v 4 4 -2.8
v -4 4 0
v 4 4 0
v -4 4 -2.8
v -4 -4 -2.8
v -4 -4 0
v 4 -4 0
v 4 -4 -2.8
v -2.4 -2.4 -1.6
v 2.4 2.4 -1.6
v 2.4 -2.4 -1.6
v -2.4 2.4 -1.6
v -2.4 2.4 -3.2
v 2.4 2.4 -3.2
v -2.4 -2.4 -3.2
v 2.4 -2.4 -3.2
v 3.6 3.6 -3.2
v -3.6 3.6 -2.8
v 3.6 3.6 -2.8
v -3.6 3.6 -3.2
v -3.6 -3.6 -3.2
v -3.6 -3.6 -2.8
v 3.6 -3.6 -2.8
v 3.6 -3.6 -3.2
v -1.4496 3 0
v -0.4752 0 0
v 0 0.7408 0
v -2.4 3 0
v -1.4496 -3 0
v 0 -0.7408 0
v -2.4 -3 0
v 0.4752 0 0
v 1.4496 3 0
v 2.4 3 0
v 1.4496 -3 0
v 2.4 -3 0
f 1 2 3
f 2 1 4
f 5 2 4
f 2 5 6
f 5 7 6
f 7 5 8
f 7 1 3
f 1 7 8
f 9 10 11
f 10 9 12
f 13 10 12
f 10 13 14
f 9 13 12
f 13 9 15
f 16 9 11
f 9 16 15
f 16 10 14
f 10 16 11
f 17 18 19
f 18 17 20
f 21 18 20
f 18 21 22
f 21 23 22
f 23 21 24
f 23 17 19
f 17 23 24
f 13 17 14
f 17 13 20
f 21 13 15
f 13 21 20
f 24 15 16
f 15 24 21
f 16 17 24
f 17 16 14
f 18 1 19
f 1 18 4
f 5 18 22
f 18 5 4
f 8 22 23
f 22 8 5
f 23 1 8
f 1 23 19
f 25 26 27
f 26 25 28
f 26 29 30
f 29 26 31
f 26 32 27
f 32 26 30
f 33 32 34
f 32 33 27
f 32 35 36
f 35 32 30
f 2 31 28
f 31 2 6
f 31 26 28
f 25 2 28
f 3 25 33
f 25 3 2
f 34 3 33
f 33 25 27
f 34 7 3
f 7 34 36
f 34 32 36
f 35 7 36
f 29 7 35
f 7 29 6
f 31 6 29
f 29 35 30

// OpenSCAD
// file: ../p/box5.scad
use <../lib.scad>
function ldraw_lib__box5() = [
// 0 Box with 5 Faces and All Edges
// 0 Name: box5.dat
// 0 Author: James Jessiman
// 0 !LDRAW_ORG Primitive UPDATE 2012-01
// 0 !LICENSE Licensed under CC BY 2.0 and CC BY 4.0 : see CAreadme.txt
// 
// 0 BFC CERTIFY CCW
  [0,"BFC","CERTIFY"],
  [0,"BFC","CCW"],
// 
// 0 !HISTORY 2002-04-03 [sbliss] Modified for BFC compliance
// 0 !HISTORY 2002-04-25 [PTadmin] Official Update 2002-02
// 0 !HISTORY 2007-06-24 [PTadmin] Header formatted for Contributor Agreement
// 0 !HISTORY 2008-07-01 [PTadmin] Official Update 2008-01
// 0 !HISTORY 2012-02-16 [Philo] Changed to CCW
// 0 !HISTORY 2012-03-30 [PTadmin] Official Update 2012-01
// 
// 
// 2 24 1 1 1 -1 1 1
  [2,24,1,1,1,-1,1,1],
// 2 24 -1 1 1 -1 1 -1
  [2,24,-1,1,1,-1,1,-1],
// 2 24 -1 1 -1 1 1 -1
  [2,24,-1,1,-1,1,1,-1],
// 2 24 1 1 -1 1 1 1
  [2,24,1,1,-1,1,1,1],
// 2 24 1 0 1 -1 0 1
  [2,24,1,0,1,-1,0,1],
// 2 24 -1 0 1 -1 0 -1
  [2,24,-1,0,1,-1,0,-1],
// 2 24 -1 0 -1 1 0 -1
  [2,24,-1,0,-1,1,0,-1],
// 2 24 1 0 -1 1 0 1
  [2,24,1,0,-1,1,0,1],
// 2 24 1 0 1 1 1 1
  [2,24,1,0,1,1,1,1],
// 2 24 -1 0 1 -1 1 1
  [2,24,-1,0,1,-1,1,1],
// 2 24 1 0 -1 1 1 -1
  [2,24,1,0,-1,1,1,-1],
// 2 24 -1 0 -1 -1 1 -1
  [2,24,-1,0,-1,-1,1,-1],
// 4 16 -1 1 1 1 1 1 1 1 -1 -1 1 -1
  [4,16,-1,1,1,1,1,1,1,1,-1,-1,1,-1],
// 4 16 -1 1 1 -1 0 1 1 0 1 1 1 1
  [4,16,-1,1,1,-1,0,1,1,0,1,1,1,1],
// 4 16 -1 1 -1 -1 0 -1 -1 0 1 -1 1 1
  [4,16,-1,1,-1,-1,0,-1,-1,0,1,-1,1,1],
// 4 16 1 1 -1 1 0 -1 -1 0 -1 -1 1 -1
  [4,16,1,1,-1,1,0,-1,-1,0,-1,-1,1,-1],
// 4 16 1 1 1 1 0 1 1 0 -1 1 1 -1
  [4,16,1,1,1,1,0,1,1,0,-1,1,1,-1],
];
module ldraw_lib__box5(step=0, col=false, unit=2/5, alt=false, line=0.2, solid=!$preview)
    makepoly(ldraw_lib__box5(), step=step, col=col, unit=unit, alt=alt, line=line, solid=solid);
ldraw_lib__box5(line=0.2);
// file: ../p/box4.scad
use <../lib.scad>
function ldraw_lib__box4() = [
// 0 Box with 4 Faces (2 Parallel Pairs) and All Edges
// 0 Name: box4.dat
// 0 Author: James Jessiman
// 0 !LDRAW_ORG Primitive UPDATE 2012-01
// 0 !LICENSE Licensed under CC BY 2.0 and CC BY 4.0 : see CAreadme.txt
// 
// 0 BFC CERTIFY CCW
  [0,"BFC","CERTIFY"],
  [0,"BFC","CCW"],
// 
// 0 !HISTORY 2002-04-03 [sbliss] Modified for BFC compliance
// 0 !HISTORY 2002-04-25 [PTadmin] Official Update 2002-02
// 0 !HISTORY 2007-06-24 [PTadmin] Header formatted for Contributor Agreement
// 0 !HISTORY 2008-07-01 [PTadmin] Official Update 2008-01
// 0 !HISTORY 2012-02-16 [Philo] Changed to CCW
// 0 !HISTORY 2012-03-30 [PTadmin] Official Update 2012-01
// 
// 
// 2 24 1 1 1 -1 1 1
  [2,24,1,1,1,-1,1,1],
// 2 24 -1 1 1 -1 1 -1
  [2,24,-1,1,1,-1,1,-1],
// 2 24 -1 1 -1 1 1 -1
  [2,24,-1,1,-1,1,1,-1],
// 2 24 1 1 -1 1 1 1
  [2,24,1,1,-1,1,1,1],
// 2 24 1 0 1 -1 0 1
  [2,24,1,0,1,-1,0,1],
// 2 24 -1 0 1 -1 0 -1
  [2,24,-1,0,1,-1,0,-1],
// 2 24 -1 0 -1 1 0 -1
  [2,24,-1,0,-1,1,0,-1],
// 2 24 1 0 -1 1 0 1
  [2,24,1,0,-1,1,0,1],
// 2 24 1 0 1 1 1 1
  [2,24,1,0,1,1,1,1],
// 2 24 -1 0 1 -1 1 1
  [2,24,-1,0,1,-1,1,1],
// 2 24 1 0 -1 1 1 -1
  [2,24,1,0,-1,1,1,-1],
// 2 24 -1 0 -1 -1 1 -1
  [2,24,-1,0,-1,-1,1,-1],
// 4 16 -1 1 1 -1 0 1 1 0 1 1 1 1
  [4,16,-1,1,1,-1,0,1,1,0,1,1,1,1],
// 4 16 -1 1 -1 -1 0 -1 -1 0 1 -1 1 1
  [4,16,-1,1,-1,-1,0,-1,-1,0,1,-1,1,1],
// 4 16 1 1 -1 1 0 -1 -1 0 -1 -1 1 -1
  [4,16,1,1,-1,1,0,-1,-1,0,-1,-1,1,-1],
// 4 16 1 1 1 1 0 1 1 0 -1 1 1 -1
  [4,16,1,1,1,1,0,1,1,0,-1,1,1,-1],
];
module ldraw_lib__box4(step=0, col=false, unit=2/5, alt=false, line=0.2, solid=!$preview)
    makepoly(ldraw_lib__box4(), step=step, col=col, unit=unit, alt=alt, line=line, solid=solid);
ldraw_lib__box4(line=0.2);
// file: s/3070bs01.scad
use <../../lib.scad>
use <../../p/box4.scad>
use <../../p/box5.scad>
function ldraw_lib__s__3070bs01() = [
// 0 ~Tile  1 x  1 with Groove without Top Face
// 0 Name: s\3070bs01.dat
// 0 Author: Chris Dee [cwdee]
// 0 !LDRAW_ORG Subpart UPDATE 2009-02
// 0 !LICENSE Licensed under CC BY 2.0 and CC BY 4.0 : see CAreadme.txt
// 
// 0 BFC CERTIFY CCW
  [0,"BFC","CERTIFY"],
  [0,"BFC","CCW"],
// 
// 0 !HISTORY 2009-09-03 [PTadmin] Official Update 2009-02
// 
// 
// 1 16 0 0 0 10 0 0 0 7 0 0 0 10 box4.dat
  [1,16,0,0,0,10,0,0,0,7,0,0,0,10, ldraw_lib__box4()],
// 0 BFC INVERTNEXT
  [0,"BFC","INVERTNEXT"],
// 1 16 0 8 0 6 0 0 0 -4 0 0 0 6 box5.dat
  [1,16,0,8,0,6,0,0,0,-4,0,0,0,6, ldraw_lib__box5()],
// 1 16 0 7 0 9 0 0 0 1 0 0 0 9 box4.dat
  [1,16,0,7,0,9,0,0,0,1,0,0,0,9, ldraw_lib__box4()],
// 
// 4 16 9 8 9 6 8 6 -6 8 6 -9 8 9
  [4,16,9,8,9,6,8,6,-6,8,6,-9,8,9],
// 4 16 -9 8 9 -6 8 6 -6 8 -6 -9 8 -9
  [4,16,-9,8,9,-6,8,6,-6,8,-6,-9,8,-9],
// 4 16 -9 8 -9 -6 8 -6 6 8 -6 9 8 -9
  [4,16,-9,8,-9,-6,8,-6,6,8,-6,9,8,-9],
// 4 16 9 8 -9 6 8 -6 6 8 6 9 8 9
  [4,16,9,8,-9,6,8,-6,6,8,6,9,8,9],
// 
// 4 16 10 7 10 9 7 9 -9 7 9 -10 7 10
  [4,16,10,7,10,9,7,9,-9,7,9,-10,7,10],
// 4 16 -10 7 10 -9 7 9 -9 7 -9 -10 7 -10
  [4,16,-10,7,10,-9,7,9,-9,7,-9,-10,7,-10],
// 4 16 -10 7 -10 -9 7 -9 9 7 -9 10 7 -10
  [4,16,-10,7,-10,-9,7,-9,9,7,-9,10,7,-10],
// 4 16 10 7 -10 9 7 -9 9 7 9 10 7 10
  [4,16,10,7,-10,9,7,-9,9,7,9,10,7,10],
// 0
];
module ldraw_lib__s__3070bs01(step=0, col=false, unit=2/5, alt=false, line=0.2, solid=!$preview)
    makepoly(ldraw_lib__s__3070bs01(), step=step, col=col, unit=unit, alt=alt, line=line, solid=solid);
ldraw_lib__s__3070bs01(line=0.2);
// file: s/3070batx.scad
use <../../lib.scad>
function ldraw_lib__s__3070batx() = [
// 0 ~Tile  1 x  1 with "X" Pattern
// 0 Name: s\3070batx.dat
// 0 Author: Chris Dee [cwdee]
// 0 !LDRAW_ORG Subpart UPDATE 2009-01
// 0 !LICENSE Licensed under CC BY 2.0 and CC BY 4.0 : see CAreadme.txt
// 
// 0 BFC CERTIFY CW
  [0,"BFC","CERTIFY"],
  [0,"BFC","CW"],
// 
// 0 !HISTORY 2009-05-02 [PTadmin] Official Update 2009-01
// 
// 
// 4 16 -1.188 0 0 -6 0 7.5 -3.624 0 7.5 0 0 1.852
  [4,16,-1.188,0,0,-6,0,7.5,-3.624,0,7.5,0,0,1.852],
// 4 16 -3.624 0 -7.5 -6 0 -7.5 -1.188 0 0 0 0 -1.852
  [4,16,-3.624,0,-7.5,-6,0,-7.5,-1.188,0,0,0,0,-1.852],
// 4 16 -1.188 0 0 0 0 1.852 1.188 0 0 0 0 -1.852
  [4,16,-1.188,0,0,0,0,1.852,1.188,0,0,0,0,-1.852],
// 4 16 3.624 0 7.5 6 0 7.5 1.188 0 0 0 0 1.852
  [4,16,3.624,0,7.5,6,0,7.5,1.188,0,0,0,0,1.852],
// 4 16 1.188 0 0 6 0 -7.5 3.624 0 -7.5 0 0 -1.852
  [4,16,1.188,0,0,6,0,-7.5,3.624,0,-7.5,0,0,-1.852],
// 0
];
module ldraw_lib__s__3070batx(step=0, col=false, unit=2/5, alt=false, line=0.2, solid=!$preview)
    makepoly(ldraw_lib__s__3070batx(), step=step, col=col, unit=unit, alt=alt, line=line, solid=solid);
ldraw_lib__s__3070batx(line=0.2);
// main file
use <../lib.scad>
use <s/3070batx.scad>
use <s/3070bs01.scad>
function ldraw_lib__3070bptx() = [
// 0 Tile  1 x  1 with Silver "X" Pattern
// 0 Name: 3070bptx.dat
// 0 Author: Chris Dee [cwdee]
// 0 !LDRAW_ORG Part UPDATE 2013-01
// 0 !LICENSE Licensed under CC BY 2.0 and CC BY 4.0 : see CAreadme.txt
// 
// 0 BFC CERTIFY CW
  [0,"BFC","CERTIFY"],
  [0,"BFC","CW"],
// 
// 0 !HISTORY 2009-05-02 [PTadmin] Official Update 2009-01
// 0 !HISTORY 2013-03-09 [MagFors] Changed colour 383 to 80 (printed silver)
// 0 !HISTORY 2013-07-21 [PTadmin] Official Update 2013-01
// 
// 
// 1 16 0 0 0 1 0 0 0 1 0 0 0 1 s\3070bs01.dat
  [1,16,0,0,0,1,0,0,0,1,0,0,0,1, ldraw_lib__s__3070bs01()],
// 1 80 0 0 0 1 0 0 0 1 0 0 0 1 s\3070batx.dat
  [1,80,0,0,0,1,0,0,0,1,0,0,0,1, ldraw_lib__s__3070batx()],
// 4 16 -6 0 -7.5 -10 0 -10 -10 0 10 -6 0 7.5
  [4,16,-6,0,-7.5,-10,0,-10,-10,0,10,-6,0,7.5],
// 3 16 -6 0 7.5 -1.188 0 0 -6 0 -7.5
  [3,16,-6,0,7.5,-1.188,0,0,-6,0,-7.5],
// 3 16 -6 0 7.5 -10 0 10 -3.624 0 7.5
  [3,16,-6,0,7.5,-10,0,10,-3.624,0,7.5],
// 4 16 -3.624 0 7.5 -10 0 10 10 0 10 3.624 0 7.5
  [4,16,-3.624,0,7.5,-10,0,10,10,0,10,3.624,0,7.5],
// 3 16 3.624 0 7.5 10 0 10 6 0 7.5
  [3,16,3.624,0,7.5,10,0,10,6,0,7.5],
// 3 16 0 0 1.852 -3.624 0 7.5 3.624 0 7.5
  [3,16,0,0,1.852,-3.624,0,7.5,3.624,0,7.5],
// 4 16 6 0 7.5 10 0 10 10 0 -10 6 0 -7.5
  [4,16,6,0,7.5,10,0,10,10,0,-10,6,0,-7.5],
// 3 16 6 0 -7.5 1.188 0 0 6 0 7.5
  [3,16,6,0,-7.5,1.188,0,0,6,0,7.5],
// 3 16 6 0 -7.5 10 0 -10 3.624 0 -7.5
  [3,16,6,0,-7.5,10,0,-10,3.624,0,-7.5],
// 4 16 3.624 0 -7.5 10 0 -10 -10 0 -10 -3.624 0 -7.5
  [4,16,3.624,0,-7.5,10,0,-10,-10,0,-10,-3.624,0,-7.5],
// 3 16 -3.624 0 -7.5 -10 0 -10 -6 0 -7.5
  [3,16,-3.624,0,-7.5,-10,0,-10,-6,0,-7.5],
// 3 16 0 0 -1.852 3.624 0 -7.5 -3.624 0 -7.5
  [3,16,0,0,-1.852,3.624,0,-7.5,-3.624,0,-7.5],
// 
];
module ldraw_lib__3070bptx(step=0, col=false, unit=2/5, alt=false, line=0.2, solid=!$preview)
    makepoly(ldraw_lib__3070bptx(), step=step, col=col, unit=unit, alt=alt, line=line, solid=solid);
ldraw_lib__3070bptx(line=0.2);
